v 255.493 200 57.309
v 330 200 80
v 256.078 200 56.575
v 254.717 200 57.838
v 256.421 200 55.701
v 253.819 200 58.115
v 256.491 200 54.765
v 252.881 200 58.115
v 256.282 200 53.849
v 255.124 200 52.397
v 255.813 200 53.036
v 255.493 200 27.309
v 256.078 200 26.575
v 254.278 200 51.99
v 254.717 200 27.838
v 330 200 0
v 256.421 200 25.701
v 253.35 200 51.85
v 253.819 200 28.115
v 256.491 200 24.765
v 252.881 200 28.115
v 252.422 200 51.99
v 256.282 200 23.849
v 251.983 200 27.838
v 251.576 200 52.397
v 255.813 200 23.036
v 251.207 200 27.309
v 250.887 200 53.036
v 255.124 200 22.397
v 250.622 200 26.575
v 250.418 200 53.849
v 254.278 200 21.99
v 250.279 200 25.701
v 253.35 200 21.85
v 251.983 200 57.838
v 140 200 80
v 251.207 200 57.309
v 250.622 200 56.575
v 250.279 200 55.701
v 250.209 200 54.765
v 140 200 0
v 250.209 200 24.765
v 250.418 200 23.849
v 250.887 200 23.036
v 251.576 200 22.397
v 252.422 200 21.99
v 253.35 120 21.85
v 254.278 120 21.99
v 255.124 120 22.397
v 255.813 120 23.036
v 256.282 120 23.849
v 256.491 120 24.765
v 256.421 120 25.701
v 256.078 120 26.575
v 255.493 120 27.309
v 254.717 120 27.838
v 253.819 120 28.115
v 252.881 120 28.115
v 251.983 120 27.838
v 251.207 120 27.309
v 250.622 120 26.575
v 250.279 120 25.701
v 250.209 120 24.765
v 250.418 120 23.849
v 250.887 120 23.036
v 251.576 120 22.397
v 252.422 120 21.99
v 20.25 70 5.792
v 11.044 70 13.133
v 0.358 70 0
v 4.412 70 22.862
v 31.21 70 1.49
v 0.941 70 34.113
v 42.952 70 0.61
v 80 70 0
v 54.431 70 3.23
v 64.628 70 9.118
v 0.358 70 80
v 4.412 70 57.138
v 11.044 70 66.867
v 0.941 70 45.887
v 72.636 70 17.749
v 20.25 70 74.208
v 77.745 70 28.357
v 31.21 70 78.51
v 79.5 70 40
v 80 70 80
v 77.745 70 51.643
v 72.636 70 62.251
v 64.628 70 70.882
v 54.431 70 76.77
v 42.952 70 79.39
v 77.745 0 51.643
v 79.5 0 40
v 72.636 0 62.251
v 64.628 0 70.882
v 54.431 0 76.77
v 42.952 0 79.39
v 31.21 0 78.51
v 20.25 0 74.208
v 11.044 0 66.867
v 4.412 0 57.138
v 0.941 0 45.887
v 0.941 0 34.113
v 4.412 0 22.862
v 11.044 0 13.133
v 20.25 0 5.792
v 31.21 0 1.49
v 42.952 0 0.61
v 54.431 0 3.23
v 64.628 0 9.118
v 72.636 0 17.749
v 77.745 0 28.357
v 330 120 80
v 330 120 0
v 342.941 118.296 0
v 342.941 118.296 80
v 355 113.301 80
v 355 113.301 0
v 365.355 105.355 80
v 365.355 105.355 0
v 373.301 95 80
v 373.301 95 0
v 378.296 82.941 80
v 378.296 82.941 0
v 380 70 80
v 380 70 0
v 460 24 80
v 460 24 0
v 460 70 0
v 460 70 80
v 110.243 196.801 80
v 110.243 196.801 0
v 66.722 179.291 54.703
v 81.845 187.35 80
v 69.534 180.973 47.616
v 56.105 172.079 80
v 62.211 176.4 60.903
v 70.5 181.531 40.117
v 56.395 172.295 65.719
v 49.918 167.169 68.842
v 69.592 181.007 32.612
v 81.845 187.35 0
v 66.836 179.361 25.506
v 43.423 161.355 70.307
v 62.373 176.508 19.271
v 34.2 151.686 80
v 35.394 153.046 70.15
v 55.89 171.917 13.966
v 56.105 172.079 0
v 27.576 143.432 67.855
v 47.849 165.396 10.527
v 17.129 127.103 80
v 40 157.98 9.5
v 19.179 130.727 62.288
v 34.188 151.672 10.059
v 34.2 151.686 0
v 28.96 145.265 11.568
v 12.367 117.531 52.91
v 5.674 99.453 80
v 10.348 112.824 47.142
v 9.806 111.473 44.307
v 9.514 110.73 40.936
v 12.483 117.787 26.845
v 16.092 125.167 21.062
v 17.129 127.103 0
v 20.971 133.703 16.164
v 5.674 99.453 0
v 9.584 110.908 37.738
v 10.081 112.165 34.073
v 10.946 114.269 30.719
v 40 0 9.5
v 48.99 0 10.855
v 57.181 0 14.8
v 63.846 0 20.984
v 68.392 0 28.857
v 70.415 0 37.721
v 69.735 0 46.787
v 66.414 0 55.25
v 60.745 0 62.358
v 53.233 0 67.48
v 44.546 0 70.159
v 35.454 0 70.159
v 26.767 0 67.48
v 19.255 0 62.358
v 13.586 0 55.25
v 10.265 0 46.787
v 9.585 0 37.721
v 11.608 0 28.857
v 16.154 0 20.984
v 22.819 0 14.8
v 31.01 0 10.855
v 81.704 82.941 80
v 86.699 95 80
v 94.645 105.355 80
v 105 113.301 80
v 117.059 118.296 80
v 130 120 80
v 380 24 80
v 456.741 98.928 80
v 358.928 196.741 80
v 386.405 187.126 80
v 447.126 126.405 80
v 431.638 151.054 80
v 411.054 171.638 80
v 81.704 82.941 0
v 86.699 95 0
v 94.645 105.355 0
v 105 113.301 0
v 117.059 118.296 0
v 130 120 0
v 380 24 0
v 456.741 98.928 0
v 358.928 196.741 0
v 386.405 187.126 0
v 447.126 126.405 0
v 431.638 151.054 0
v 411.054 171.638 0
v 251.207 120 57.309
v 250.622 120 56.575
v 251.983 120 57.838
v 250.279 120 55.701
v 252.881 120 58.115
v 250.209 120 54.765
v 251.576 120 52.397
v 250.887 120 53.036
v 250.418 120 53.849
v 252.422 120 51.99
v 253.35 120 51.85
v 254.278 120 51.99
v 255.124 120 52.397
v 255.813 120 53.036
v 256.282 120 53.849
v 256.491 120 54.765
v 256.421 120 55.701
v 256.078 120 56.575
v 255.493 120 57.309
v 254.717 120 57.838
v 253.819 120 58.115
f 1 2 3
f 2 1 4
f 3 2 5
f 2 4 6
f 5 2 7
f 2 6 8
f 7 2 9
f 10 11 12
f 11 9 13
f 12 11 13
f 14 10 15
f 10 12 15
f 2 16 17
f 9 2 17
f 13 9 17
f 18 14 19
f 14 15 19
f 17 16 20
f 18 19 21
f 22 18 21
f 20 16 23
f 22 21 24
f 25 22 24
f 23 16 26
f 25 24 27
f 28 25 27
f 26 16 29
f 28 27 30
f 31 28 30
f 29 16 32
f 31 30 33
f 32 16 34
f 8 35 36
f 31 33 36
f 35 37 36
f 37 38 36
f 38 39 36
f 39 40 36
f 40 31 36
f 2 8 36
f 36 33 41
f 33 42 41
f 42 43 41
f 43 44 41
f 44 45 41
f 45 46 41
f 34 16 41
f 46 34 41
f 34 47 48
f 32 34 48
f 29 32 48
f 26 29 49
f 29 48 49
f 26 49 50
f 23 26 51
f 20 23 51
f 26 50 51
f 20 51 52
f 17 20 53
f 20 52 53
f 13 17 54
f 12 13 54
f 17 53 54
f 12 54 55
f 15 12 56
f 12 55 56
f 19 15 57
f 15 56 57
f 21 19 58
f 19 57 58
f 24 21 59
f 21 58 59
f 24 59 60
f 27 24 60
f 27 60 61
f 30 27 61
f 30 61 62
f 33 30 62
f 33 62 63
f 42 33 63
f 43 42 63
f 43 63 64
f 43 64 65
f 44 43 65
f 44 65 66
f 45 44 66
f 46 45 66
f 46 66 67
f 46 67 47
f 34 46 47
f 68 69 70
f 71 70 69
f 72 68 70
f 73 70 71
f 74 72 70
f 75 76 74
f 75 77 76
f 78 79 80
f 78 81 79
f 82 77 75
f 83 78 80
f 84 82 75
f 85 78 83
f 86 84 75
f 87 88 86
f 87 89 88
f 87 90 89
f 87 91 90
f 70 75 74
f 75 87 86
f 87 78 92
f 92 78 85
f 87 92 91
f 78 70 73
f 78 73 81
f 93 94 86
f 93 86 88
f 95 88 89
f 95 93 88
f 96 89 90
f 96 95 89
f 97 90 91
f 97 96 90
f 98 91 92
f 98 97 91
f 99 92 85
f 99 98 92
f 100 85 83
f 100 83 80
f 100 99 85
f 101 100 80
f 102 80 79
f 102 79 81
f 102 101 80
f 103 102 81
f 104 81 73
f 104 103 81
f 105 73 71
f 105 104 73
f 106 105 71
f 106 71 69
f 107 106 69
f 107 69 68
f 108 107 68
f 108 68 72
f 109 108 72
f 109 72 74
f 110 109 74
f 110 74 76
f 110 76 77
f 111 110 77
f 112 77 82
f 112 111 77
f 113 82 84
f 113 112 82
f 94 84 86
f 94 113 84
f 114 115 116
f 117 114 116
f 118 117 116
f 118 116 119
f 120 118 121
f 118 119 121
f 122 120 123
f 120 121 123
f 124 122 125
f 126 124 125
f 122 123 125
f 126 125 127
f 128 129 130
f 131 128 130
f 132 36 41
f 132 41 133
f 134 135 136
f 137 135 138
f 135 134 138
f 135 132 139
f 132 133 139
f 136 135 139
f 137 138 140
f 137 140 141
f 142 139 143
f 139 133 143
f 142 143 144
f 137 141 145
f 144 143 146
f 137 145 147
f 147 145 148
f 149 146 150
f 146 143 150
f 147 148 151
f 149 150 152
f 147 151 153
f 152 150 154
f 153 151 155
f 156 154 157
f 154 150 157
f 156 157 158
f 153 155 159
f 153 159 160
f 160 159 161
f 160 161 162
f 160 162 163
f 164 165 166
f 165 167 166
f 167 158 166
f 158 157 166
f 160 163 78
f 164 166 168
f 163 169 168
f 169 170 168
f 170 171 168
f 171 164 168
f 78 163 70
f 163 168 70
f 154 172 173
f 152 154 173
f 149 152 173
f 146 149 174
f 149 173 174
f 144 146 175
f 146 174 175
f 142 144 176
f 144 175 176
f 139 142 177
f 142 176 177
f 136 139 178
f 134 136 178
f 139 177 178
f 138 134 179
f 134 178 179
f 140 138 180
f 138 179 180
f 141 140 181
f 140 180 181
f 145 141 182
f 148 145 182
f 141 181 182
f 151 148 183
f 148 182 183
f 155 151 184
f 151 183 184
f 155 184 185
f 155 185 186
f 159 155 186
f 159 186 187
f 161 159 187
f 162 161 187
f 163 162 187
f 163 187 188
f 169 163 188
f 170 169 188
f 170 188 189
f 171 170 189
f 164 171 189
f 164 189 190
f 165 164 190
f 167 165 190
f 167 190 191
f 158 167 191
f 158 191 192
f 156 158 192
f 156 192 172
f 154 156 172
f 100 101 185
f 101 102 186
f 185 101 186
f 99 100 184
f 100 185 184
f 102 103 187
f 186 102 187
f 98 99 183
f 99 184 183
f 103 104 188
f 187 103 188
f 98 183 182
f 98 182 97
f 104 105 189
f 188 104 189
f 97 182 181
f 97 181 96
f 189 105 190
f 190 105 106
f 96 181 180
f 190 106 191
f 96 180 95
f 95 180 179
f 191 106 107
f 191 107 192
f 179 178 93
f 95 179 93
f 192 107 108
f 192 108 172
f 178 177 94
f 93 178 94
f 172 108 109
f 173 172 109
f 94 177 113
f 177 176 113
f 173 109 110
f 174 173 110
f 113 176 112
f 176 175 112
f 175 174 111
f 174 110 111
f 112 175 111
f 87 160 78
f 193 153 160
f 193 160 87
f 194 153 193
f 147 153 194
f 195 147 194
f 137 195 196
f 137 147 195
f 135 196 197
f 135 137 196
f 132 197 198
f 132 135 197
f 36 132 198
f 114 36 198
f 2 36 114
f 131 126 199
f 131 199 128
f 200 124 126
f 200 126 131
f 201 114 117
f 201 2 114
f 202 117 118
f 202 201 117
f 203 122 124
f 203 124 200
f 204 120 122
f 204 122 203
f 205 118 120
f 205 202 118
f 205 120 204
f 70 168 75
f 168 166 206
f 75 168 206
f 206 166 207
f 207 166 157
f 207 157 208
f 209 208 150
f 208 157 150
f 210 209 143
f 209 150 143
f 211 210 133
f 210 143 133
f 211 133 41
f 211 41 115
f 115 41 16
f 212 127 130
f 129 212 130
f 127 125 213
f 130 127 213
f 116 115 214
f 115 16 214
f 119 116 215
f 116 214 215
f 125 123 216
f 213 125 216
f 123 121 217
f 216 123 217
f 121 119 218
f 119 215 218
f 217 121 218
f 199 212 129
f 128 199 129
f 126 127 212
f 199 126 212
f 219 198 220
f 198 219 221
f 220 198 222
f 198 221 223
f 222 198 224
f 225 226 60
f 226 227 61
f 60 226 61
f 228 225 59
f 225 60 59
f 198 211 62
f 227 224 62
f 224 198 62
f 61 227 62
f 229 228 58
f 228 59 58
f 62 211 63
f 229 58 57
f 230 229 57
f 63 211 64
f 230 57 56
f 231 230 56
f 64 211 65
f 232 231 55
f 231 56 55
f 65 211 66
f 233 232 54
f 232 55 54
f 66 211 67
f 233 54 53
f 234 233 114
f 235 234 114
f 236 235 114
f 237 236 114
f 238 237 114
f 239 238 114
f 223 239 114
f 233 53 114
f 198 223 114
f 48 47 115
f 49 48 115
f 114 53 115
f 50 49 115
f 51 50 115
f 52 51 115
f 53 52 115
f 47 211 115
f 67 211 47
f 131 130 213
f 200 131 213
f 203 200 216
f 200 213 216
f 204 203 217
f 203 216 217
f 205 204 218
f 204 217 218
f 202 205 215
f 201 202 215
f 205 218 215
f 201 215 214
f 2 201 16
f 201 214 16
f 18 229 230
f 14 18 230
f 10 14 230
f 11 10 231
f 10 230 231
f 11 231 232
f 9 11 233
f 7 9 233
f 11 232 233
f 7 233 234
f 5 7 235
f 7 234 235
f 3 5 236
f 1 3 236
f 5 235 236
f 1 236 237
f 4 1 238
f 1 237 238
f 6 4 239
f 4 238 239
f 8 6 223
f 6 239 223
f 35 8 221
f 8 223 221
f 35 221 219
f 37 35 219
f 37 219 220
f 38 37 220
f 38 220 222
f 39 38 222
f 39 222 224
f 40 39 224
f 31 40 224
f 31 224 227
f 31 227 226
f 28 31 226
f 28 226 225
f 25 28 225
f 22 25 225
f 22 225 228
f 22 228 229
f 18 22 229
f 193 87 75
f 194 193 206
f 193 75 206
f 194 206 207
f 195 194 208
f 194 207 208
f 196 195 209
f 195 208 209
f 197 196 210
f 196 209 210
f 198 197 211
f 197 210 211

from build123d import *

# Parameters (mm, degrees)
BOSS_EXTRUDE1_DEPTH     = 80
SKETCH5_R               = 59.5
SKETCH5_R_2             = 39.5
CUT_EXTRUDE_THIN2_DEPTH = 70
SKETCH6_R               = 30.5
CUT_EXTRUDE9_DEPTH      = 508.937003968
F_3_0MM_DOWEL_HOLE1_D   = 6.3


with BuildPart() as part:
    # Sketch1 → Boss-Extrude1 (new body)
    with BuildSketch(Plane.XY):
        with BuildLine():
            Line((0, 0), (80, 0))
            Line((80, 0), (80, 70))
            ThreePointArc((80, 70), (94.644660941, 105.355339059), (130, 120))
            Line((130, 120), (235, 120))
            Line((235, 120), (330, 120))
            ThreePointArc((330, 120), (365.355339059, 105.355339059), (380, 70))
            Line((380, 70), (380, 24))
            Line((380, 24), (460, 24))
            Line((460, 24), (460, 70))
            ThreePointArc((460, 70), (421.923881554, 161.923881554), (330, 200))
            Line((330, 200), (140, 200))
            ThreePointArc((140, 200), (41.005050634, 158.994949366), (0, 60))
            Line((0, 60), (0, 0))
        make_face()
    extrude(amount=BOSS_EXTRUDE1_DEPTH)

    # Sketch5 → Cut-Extrude-Thin2 (cut)
    with BuildSketch(Plane.XZ):
        with Locations((40, 40)):
            Circle(SKETCH5_R)
        with Locations((40, 40)):
            Circle(SKETCH5_R_2, mode=Mode.SUBTRACT)
    extrude(amount=-CUT_EXTRUDE_THIN2_DEPTH, mode=Mode.SUBTRACT)

    # Sketch6 → Cut-Extrude9 (cut, through all)
    with BuildSketch(Plane.XZ):
        with Locations(Location((40, 40, 0), (0, 0, 270))):
            Circle(SKETCH6_R)
    extrude(amount=-CUT_EXTRUDE9_DEPTH, mode=Mode.SUBTRACT)

    # Ø3.0mm Dowel Hole1 (through all)
    with Locations(Plane(origin=(253.35, 200, 55), x_dir=(0, 0, 1), z_dir=(0, 1, 0))):
        with Locations((0, 0), (-30, 0)):
            Hole(F_3_0MM_DOWEL_HOLE1_D / 2)


solid = part.part
